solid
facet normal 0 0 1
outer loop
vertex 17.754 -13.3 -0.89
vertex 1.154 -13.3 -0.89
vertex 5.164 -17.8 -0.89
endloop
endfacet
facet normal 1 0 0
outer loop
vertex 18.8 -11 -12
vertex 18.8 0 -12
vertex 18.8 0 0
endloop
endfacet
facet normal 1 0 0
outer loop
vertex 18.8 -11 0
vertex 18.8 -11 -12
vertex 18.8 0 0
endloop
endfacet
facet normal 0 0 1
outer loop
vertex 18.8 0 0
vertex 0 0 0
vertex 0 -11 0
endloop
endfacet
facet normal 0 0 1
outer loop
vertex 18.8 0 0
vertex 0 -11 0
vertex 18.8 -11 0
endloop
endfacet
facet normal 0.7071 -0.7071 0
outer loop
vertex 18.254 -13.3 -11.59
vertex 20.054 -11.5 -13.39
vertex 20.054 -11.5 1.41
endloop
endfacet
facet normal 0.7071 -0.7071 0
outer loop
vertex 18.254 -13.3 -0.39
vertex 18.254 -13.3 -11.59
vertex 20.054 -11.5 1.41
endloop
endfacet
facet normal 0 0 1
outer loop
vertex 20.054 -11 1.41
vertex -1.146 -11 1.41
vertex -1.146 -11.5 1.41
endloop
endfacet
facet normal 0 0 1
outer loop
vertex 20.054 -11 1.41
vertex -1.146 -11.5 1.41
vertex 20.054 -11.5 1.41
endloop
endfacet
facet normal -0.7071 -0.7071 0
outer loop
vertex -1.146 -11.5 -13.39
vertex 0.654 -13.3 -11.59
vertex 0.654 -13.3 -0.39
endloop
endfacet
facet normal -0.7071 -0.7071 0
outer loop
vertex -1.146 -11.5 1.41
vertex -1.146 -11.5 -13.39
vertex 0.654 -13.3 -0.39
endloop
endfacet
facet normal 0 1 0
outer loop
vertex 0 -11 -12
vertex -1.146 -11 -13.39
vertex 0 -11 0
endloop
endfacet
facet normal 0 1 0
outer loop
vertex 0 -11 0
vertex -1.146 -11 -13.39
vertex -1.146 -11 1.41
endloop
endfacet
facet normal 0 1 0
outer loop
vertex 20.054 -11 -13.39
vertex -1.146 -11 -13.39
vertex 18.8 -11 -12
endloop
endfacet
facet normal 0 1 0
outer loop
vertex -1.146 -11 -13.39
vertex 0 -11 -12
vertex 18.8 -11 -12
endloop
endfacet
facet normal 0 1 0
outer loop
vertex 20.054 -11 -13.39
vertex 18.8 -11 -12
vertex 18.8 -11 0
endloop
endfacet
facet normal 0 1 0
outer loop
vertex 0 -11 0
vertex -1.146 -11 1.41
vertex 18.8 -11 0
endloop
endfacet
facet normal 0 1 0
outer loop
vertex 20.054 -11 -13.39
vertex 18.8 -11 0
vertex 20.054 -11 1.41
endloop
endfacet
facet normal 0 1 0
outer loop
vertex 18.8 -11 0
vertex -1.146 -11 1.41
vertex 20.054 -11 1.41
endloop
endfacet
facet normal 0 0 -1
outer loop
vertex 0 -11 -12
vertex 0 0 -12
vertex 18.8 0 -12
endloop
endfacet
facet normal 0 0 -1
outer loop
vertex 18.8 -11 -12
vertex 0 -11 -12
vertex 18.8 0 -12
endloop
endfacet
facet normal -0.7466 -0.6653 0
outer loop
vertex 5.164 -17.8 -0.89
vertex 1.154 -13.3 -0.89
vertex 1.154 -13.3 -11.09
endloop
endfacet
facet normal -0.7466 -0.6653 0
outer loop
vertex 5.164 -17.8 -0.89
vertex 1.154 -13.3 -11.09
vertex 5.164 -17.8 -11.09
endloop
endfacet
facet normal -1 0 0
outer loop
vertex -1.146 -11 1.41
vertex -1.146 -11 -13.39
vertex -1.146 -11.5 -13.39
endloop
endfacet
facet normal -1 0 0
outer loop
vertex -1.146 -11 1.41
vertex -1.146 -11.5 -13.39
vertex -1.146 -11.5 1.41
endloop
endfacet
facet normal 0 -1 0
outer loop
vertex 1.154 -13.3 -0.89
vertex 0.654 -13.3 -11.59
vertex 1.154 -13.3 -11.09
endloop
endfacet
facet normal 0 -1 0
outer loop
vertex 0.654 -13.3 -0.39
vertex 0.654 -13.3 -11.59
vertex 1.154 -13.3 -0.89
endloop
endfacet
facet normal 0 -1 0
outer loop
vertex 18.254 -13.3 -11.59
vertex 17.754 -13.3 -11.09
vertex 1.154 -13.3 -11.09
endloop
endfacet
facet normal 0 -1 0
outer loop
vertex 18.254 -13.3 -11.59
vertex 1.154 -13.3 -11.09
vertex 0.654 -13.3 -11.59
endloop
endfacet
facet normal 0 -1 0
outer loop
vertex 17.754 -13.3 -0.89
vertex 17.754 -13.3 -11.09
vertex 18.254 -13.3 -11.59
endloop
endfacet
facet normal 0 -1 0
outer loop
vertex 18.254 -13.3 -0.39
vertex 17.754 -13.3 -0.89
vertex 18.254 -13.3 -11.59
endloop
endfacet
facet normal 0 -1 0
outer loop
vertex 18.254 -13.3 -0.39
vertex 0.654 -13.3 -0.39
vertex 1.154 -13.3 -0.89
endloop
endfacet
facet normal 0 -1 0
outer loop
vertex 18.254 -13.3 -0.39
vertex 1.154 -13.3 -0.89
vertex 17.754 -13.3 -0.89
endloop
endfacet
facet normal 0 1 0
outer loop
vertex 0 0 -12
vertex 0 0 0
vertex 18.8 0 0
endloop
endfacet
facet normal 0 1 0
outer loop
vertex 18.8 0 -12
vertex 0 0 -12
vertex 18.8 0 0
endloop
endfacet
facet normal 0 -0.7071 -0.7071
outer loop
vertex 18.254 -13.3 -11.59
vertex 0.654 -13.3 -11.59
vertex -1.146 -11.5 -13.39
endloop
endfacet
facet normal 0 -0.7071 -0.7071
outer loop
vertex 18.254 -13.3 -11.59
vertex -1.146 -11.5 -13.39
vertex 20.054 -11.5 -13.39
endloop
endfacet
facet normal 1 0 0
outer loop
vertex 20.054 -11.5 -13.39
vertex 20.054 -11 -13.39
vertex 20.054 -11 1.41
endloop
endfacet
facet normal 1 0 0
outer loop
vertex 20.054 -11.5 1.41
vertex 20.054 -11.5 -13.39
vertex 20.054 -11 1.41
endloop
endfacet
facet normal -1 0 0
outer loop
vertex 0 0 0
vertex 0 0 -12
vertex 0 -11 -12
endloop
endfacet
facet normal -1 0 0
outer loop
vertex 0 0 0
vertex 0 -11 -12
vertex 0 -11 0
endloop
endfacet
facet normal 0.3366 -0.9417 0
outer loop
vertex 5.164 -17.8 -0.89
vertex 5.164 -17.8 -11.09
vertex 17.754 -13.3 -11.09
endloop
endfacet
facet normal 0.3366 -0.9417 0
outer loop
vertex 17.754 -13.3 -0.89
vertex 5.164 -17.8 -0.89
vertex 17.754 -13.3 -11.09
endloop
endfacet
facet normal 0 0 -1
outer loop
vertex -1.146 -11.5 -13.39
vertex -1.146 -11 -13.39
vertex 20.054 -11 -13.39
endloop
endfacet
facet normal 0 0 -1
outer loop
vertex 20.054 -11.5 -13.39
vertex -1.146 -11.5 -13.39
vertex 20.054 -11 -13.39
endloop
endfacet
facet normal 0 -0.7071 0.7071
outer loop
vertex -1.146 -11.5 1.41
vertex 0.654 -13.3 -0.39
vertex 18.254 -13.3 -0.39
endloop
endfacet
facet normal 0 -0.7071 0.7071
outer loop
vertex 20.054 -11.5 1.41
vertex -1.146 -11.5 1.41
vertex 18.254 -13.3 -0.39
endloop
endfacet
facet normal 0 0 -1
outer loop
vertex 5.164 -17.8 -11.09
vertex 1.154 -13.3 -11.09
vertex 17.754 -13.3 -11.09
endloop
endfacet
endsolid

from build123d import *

# Parameters (mm, degrees)
F0_W     = 18.8
F0_H     = 12
F1_DEPTH = 11
F2_W     = 21.2
F2_H     = 14.8
F3_DEPTH = 2.3
F4_SIZE  = 1.8
F5_W     = 16.6
F5_H     = 10.2
F6_DEPTH = 4.5
F8_DEPTH = 25


with BuildPart() as f1:
    # F0 (on Front) → F1 (new body)
    with BuildSketch(Plane.XZ):
        with Locations((9.4, -6)):
            Rectangle(F0_W, F0_H)
    extrude(amount=F1_DEPTH)

    # F2 (on face) → F3 (join)
    with BuildSketch(Plane.XZ.offset(11)):
        with Locations((9.453604, -5.990063)):
            Rectangle(F2_W, F2_H)
    extrude(amount=F3_DEPTH)

    # F4
    f4_edges = [f1.edges().sort_by_distance(p)[0] for p in [
        (-1.146396, -13.3, -5.990063),
        (9.453604, -13.3, -13.390063),
        (20.053604, -13.3, -5.990063),
        (9.453604, -13.3, 1.409937),
    ]]
    chamfer(f4_edges, length=F4_SIZE)

    # F5 (on face) → F6 (join)
    with BuildSketch(Plane.XZ.offset(13.3)):
        with Locations((9.453604, -5.990063)):
            Rectangle(F5_W, F5_H)
    extrude(amount=F6_DEPTH)

    # F7 (on face) → F8 (cut)
    with BuildSketch(Plane(origin=(0, 0, -11.090063), x_dir=(1, 0, 0), z_dir=(0, 0, -1))):
        Polygon((1.153604, 17.8), (1.153604, 13.3), (5.163922, 17.8), align=None)
        Polygon((17.753604, 17.8), (5.163922, 17.8), (17.753604, 13.3), align=None)
    extrude(amount=-F8_DEPTH, mode=Mode.SUBTRACT)


solid = f1.part
